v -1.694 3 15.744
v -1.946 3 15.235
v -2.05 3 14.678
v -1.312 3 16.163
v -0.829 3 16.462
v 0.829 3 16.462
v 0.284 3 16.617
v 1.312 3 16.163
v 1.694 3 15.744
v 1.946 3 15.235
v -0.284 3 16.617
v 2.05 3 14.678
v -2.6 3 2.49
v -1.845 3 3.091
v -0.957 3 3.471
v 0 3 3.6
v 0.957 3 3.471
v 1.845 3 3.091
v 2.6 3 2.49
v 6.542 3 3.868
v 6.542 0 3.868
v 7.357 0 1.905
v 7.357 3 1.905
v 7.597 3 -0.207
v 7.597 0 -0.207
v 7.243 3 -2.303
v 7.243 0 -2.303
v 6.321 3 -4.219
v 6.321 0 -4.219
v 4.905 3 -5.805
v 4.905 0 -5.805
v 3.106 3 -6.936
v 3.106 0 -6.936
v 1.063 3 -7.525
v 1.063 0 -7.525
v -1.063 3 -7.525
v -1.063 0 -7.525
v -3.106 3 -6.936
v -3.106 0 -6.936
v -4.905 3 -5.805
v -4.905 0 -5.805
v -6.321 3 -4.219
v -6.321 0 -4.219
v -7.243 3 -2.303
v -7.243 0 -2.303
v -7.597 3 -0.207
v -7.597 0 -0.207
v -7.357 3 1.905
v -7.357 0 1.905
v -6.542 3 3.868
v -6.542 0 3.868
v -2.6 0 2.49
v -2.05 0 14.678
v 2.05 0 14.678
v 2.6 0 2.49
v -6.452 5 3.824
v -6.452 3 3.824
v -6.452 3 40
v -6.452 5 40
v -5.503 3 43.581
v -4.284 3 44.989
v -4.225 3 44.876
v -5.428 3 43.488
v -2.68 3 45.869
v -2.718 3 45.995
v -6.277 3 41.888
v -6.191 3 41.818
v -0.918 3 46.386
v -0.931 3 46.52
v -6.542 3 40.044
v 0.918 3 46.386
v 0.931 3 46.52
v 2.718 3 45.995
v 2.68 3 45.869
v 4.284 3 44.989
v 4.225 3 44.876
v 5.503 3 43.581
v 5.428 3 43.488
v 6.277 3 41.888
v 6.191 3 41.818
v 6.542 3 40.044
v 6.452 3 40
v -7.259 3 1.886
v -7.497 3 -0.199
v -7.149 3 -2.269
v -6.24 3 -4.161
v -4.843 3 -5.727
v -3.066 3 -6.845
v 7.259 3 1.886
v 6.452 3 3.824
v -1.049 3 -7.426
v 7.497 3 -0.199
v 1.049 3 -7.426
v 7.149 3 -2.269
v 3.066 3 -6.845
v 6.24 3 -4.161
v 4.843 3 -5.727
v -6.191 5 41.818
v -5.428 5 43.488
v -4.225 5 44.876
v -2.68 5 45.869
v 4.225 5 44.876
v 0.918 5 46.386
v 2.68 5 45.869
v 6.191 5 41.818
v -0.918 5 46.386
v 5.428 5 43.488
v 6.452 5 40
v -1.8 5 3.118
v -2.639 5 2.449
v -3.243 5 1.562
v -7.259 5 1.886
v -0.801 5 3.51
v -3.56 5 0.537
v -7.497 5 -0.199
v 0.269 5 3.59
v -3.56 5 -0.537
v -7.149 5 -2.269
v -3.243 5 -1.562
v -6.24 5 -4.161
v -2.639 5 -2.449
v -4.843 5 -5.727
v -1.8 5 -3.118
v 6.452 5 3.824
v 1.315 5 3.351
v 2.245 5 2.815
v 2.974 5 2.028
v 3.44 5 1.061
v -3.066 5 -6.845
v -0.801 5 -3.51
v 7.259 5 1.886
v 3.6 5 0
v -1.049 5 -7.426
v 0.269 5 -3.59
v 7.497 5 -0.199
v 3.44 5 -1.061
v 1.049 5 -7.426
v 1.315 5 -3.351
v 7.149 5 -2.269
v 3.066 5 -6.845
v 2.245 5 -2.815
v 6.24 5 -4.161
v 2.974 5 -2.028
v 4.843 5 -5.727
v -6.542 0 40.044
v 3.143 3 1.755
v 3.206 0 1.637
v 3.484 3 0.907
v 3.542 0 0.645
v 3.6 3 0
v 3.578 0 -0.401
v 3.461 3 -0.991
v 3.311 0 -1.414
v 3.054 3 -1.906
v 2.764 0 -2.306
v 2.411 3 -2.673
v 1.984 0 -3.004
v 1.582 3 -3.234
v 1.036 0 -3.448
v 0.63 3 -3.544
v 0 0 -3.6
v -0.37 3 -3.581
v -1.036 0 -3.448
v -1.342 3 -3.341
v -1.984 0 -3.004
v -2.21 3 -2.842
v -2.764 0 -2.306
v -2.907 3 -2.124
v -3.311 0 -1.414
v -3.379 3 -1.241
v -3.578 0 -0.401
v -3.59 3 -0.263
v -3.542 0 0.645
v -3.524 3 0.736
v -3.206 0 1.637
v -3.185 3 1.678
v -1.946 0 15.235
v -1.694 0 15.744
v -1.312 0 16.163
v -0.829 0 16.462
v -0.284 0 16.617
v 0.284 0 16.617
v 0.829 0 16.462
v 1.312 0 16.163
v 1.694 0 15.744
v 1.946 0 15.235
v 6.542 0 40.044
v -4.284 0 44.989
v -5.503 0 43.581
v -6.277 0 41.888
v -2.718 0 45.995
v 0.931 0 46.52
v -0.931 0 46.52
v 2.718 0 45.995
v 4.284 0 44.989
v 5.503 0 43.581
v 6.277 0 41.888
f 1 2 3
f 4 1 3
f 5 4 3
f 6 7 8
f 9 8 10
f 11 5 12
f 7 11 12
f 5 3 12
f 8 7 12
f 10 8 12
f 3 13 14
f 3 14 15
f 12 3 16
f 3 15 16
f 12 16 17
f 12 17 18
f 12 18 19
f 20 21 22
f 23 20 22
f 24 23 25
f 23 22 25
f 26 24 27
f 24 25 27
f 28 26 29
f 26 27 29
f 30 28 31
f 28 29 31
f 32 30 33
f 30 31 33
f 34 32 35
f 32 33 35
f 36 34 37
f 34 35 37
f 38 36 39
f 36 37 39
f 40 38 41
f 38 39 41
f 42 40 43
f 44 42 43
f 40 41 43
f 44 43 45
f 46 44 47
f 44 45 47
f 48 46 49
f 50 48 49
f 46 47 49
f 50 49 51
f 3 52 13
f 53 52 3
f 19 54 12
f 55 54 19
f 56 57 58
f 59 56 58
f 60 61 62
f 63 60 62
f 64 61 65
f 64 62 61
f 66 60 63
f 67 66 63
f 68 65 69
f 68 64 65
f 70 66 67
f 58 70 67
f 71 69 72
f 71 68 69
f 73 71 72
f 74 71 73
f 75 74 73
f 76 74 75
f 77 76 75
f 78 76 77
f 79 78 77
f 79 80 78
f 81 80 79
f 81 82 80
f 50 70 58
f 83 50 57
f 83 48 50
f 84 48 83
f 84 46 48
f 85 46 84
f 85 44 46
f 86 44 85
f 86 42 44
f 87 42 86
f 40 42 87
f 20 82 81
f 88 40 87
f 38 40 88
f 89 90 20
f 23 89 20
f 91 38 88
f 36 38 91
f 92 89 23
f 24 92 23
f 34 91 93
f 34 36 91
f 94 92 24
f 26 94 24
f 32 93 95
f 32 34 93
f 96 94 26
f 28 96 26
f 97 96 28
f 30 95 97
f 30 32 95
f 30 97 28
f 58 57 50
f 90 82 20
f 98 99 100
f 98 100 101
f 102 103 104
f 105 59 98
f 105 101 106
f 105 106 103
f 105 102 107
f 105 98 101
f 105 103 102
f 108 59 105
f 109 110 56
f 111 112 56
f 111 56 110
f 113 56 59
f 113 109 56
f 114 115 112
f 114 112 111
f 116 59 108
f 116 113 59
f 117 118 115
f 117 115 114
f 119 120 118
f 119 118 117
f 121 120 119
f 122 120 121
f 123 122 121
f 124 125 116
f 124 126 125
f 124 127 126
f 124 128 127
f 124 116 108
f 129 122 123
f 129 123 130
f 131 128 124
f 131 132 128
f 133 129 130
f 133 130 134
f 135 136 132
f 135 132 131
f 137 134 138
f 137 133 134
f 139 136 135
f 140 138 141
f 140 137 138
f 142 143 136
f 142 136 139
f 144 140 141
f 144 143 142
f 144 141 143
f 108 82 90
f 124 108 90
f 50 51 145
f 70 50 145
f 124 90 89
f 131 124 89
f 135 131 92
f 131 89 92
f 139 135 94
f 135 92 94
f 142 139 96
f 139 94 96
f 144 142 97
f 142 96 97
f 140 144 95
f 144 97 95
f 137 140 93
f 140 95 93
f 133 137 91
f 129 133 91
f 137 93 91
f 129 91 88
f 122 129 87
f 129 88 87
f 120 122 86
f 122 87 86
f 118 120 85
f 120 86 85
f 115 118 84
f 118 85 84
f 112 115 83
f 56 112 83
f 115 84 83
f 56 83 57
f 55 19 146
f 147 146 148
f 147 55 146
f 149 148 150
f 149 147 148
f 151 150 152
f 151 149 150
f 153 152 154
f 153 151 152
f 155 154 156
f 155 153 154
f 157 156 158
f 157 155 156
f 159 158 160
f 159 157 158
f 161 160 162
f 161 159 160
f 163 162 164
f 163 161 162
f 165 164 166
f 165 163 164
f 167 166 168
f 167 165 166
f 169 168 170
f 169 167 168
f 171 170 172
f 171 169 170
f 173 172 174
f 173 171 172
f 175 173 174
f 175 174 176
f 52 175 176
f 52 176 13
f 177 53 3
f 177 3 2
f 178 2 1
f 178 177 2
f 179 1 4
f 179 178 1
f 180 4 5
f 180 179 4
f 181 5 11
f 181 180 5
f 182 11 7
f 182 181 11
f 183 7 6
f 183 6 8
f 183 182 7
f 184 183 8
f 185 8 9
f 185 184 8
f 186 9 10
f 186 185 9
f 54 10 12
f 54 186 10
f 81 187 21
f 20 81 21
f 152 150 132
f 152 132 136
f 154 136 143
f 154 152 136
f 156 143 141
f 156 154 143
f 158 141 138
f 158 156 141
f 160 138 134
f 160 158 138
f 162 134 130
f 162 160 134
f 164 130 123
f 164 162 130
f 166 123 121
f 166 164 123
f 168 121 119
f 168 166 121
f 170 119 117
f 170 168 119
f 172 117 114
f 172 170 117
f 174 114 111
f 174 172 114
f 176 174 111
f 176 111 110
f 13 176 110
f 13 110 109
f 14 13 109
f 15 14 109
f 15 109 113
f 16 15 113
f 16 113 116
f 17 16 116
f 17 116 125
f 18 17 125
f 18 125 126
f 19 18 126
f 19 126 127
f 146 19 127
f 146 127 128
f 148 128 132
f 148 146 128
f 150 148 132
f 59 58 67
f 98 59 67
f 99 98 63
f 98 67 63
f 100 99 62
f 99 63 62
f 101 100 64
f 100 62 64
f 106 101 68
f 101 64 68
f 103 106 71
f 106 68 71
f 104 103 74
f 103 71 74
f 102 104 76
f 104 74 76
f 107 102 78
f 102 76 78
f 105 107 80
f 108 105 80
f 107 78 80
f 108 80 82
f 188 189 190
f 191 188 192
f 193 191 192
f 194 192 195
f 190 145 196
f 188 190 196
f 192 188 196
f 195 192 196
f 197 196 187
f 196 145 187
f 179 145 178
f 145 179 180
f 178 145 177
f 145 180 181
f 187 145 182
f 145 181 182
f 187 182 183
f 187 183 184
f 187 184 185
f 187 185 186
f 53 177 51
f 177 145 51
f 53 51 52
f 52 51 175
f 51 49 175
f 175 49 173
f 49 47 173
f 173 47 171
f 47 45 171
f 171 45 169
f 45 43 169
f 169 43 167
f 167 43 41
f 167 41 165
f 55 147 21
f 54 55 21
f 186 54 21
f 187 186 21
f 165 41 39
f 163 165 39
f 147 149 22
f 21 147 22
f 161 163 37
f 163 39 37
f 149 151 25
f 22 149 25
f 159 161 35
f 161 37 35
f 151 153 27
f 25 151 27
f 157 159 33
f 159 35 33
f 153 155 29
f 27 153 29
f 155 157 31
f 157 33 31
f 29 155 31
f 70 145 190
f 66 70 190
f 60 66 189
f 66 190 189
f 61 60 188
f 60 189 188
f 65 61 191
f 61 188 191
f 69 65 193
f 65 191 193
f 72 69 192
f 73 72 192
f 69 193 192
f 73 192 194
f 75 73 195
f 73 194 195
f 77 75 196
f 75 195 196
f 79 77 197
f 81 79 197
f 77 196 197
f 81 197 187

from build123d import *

# Parameters (mm, degrees)
EXTRUDE_1_DEPTH = 3
SKETCH_2_R      = 3.6
EXTRUDE_2_DEPTH = 2


with BuildPart() as part:
    # 草圖1 → 填料-伸長1 (new body)
    with BuildSketch(Plane(origin=(0, 0, 0), x_dir=(1, 0, 0), z_dir=(0, 1, 0))):
        with BuildLine():
            Line((-6.54186917, -3.868326222), (-6.54186917, -40.044486982))
            ThreePointArc((-6.54186917, -40.044486982), (0, -46.586356152), (6.54186917, -40.044486982))
            Line((6.54186917, -40.044486982), (6.54186917, -3.868326222))
            ThreePointArc((6.54186917, -3.868326222), (0, 7.6), (-6.54186917, -3.868326222))
        make_face()
        with BuildLine():
            Line((-2.6, -2.48997992), (-2.05, -14.677576073))
            ThreePointArc((-2.05, -14.677576073), (0, -16.637150357), (2.05, -14.677576073))
            Line((2.05, -14.677576073), (2.6, -2.48997992))
            ThreePointArc((2.6, -2.48997992), (0, 3.6), (-2.6, -2.48997992))
        make_face(mode=Mode.SUBTRACT)
    extrude(amount=EXTRUDE_1_DEPTH)

    # 草圖2 → 填料-伸長2 (add)
    with BuildSketch(Plane(origin=(0, 3, 0), x_dir=(1, 0, 0), z_dir=(0, 1, 0))):
        with BuildLine():
            Line((-6.451996083, -3.823839241), (-6.451996083, -40))
            ThreePointArc((-6.451996083, -40), (0, -46.451996083), (6.451996083, -40))
            Line((6.451996083, -40), (6.451996083, -3.823839241))
            ThreePointArc((6.451996083, -3.823839241), (0, 7.5), (-6.451996083, -3.823839241))
        make_face()
        Circle(SKETCH_2_R, mode=Mode.SUBTRACT)
    extrude(amount=EXTRUDE_2_DEPTH)


solid = part.part
